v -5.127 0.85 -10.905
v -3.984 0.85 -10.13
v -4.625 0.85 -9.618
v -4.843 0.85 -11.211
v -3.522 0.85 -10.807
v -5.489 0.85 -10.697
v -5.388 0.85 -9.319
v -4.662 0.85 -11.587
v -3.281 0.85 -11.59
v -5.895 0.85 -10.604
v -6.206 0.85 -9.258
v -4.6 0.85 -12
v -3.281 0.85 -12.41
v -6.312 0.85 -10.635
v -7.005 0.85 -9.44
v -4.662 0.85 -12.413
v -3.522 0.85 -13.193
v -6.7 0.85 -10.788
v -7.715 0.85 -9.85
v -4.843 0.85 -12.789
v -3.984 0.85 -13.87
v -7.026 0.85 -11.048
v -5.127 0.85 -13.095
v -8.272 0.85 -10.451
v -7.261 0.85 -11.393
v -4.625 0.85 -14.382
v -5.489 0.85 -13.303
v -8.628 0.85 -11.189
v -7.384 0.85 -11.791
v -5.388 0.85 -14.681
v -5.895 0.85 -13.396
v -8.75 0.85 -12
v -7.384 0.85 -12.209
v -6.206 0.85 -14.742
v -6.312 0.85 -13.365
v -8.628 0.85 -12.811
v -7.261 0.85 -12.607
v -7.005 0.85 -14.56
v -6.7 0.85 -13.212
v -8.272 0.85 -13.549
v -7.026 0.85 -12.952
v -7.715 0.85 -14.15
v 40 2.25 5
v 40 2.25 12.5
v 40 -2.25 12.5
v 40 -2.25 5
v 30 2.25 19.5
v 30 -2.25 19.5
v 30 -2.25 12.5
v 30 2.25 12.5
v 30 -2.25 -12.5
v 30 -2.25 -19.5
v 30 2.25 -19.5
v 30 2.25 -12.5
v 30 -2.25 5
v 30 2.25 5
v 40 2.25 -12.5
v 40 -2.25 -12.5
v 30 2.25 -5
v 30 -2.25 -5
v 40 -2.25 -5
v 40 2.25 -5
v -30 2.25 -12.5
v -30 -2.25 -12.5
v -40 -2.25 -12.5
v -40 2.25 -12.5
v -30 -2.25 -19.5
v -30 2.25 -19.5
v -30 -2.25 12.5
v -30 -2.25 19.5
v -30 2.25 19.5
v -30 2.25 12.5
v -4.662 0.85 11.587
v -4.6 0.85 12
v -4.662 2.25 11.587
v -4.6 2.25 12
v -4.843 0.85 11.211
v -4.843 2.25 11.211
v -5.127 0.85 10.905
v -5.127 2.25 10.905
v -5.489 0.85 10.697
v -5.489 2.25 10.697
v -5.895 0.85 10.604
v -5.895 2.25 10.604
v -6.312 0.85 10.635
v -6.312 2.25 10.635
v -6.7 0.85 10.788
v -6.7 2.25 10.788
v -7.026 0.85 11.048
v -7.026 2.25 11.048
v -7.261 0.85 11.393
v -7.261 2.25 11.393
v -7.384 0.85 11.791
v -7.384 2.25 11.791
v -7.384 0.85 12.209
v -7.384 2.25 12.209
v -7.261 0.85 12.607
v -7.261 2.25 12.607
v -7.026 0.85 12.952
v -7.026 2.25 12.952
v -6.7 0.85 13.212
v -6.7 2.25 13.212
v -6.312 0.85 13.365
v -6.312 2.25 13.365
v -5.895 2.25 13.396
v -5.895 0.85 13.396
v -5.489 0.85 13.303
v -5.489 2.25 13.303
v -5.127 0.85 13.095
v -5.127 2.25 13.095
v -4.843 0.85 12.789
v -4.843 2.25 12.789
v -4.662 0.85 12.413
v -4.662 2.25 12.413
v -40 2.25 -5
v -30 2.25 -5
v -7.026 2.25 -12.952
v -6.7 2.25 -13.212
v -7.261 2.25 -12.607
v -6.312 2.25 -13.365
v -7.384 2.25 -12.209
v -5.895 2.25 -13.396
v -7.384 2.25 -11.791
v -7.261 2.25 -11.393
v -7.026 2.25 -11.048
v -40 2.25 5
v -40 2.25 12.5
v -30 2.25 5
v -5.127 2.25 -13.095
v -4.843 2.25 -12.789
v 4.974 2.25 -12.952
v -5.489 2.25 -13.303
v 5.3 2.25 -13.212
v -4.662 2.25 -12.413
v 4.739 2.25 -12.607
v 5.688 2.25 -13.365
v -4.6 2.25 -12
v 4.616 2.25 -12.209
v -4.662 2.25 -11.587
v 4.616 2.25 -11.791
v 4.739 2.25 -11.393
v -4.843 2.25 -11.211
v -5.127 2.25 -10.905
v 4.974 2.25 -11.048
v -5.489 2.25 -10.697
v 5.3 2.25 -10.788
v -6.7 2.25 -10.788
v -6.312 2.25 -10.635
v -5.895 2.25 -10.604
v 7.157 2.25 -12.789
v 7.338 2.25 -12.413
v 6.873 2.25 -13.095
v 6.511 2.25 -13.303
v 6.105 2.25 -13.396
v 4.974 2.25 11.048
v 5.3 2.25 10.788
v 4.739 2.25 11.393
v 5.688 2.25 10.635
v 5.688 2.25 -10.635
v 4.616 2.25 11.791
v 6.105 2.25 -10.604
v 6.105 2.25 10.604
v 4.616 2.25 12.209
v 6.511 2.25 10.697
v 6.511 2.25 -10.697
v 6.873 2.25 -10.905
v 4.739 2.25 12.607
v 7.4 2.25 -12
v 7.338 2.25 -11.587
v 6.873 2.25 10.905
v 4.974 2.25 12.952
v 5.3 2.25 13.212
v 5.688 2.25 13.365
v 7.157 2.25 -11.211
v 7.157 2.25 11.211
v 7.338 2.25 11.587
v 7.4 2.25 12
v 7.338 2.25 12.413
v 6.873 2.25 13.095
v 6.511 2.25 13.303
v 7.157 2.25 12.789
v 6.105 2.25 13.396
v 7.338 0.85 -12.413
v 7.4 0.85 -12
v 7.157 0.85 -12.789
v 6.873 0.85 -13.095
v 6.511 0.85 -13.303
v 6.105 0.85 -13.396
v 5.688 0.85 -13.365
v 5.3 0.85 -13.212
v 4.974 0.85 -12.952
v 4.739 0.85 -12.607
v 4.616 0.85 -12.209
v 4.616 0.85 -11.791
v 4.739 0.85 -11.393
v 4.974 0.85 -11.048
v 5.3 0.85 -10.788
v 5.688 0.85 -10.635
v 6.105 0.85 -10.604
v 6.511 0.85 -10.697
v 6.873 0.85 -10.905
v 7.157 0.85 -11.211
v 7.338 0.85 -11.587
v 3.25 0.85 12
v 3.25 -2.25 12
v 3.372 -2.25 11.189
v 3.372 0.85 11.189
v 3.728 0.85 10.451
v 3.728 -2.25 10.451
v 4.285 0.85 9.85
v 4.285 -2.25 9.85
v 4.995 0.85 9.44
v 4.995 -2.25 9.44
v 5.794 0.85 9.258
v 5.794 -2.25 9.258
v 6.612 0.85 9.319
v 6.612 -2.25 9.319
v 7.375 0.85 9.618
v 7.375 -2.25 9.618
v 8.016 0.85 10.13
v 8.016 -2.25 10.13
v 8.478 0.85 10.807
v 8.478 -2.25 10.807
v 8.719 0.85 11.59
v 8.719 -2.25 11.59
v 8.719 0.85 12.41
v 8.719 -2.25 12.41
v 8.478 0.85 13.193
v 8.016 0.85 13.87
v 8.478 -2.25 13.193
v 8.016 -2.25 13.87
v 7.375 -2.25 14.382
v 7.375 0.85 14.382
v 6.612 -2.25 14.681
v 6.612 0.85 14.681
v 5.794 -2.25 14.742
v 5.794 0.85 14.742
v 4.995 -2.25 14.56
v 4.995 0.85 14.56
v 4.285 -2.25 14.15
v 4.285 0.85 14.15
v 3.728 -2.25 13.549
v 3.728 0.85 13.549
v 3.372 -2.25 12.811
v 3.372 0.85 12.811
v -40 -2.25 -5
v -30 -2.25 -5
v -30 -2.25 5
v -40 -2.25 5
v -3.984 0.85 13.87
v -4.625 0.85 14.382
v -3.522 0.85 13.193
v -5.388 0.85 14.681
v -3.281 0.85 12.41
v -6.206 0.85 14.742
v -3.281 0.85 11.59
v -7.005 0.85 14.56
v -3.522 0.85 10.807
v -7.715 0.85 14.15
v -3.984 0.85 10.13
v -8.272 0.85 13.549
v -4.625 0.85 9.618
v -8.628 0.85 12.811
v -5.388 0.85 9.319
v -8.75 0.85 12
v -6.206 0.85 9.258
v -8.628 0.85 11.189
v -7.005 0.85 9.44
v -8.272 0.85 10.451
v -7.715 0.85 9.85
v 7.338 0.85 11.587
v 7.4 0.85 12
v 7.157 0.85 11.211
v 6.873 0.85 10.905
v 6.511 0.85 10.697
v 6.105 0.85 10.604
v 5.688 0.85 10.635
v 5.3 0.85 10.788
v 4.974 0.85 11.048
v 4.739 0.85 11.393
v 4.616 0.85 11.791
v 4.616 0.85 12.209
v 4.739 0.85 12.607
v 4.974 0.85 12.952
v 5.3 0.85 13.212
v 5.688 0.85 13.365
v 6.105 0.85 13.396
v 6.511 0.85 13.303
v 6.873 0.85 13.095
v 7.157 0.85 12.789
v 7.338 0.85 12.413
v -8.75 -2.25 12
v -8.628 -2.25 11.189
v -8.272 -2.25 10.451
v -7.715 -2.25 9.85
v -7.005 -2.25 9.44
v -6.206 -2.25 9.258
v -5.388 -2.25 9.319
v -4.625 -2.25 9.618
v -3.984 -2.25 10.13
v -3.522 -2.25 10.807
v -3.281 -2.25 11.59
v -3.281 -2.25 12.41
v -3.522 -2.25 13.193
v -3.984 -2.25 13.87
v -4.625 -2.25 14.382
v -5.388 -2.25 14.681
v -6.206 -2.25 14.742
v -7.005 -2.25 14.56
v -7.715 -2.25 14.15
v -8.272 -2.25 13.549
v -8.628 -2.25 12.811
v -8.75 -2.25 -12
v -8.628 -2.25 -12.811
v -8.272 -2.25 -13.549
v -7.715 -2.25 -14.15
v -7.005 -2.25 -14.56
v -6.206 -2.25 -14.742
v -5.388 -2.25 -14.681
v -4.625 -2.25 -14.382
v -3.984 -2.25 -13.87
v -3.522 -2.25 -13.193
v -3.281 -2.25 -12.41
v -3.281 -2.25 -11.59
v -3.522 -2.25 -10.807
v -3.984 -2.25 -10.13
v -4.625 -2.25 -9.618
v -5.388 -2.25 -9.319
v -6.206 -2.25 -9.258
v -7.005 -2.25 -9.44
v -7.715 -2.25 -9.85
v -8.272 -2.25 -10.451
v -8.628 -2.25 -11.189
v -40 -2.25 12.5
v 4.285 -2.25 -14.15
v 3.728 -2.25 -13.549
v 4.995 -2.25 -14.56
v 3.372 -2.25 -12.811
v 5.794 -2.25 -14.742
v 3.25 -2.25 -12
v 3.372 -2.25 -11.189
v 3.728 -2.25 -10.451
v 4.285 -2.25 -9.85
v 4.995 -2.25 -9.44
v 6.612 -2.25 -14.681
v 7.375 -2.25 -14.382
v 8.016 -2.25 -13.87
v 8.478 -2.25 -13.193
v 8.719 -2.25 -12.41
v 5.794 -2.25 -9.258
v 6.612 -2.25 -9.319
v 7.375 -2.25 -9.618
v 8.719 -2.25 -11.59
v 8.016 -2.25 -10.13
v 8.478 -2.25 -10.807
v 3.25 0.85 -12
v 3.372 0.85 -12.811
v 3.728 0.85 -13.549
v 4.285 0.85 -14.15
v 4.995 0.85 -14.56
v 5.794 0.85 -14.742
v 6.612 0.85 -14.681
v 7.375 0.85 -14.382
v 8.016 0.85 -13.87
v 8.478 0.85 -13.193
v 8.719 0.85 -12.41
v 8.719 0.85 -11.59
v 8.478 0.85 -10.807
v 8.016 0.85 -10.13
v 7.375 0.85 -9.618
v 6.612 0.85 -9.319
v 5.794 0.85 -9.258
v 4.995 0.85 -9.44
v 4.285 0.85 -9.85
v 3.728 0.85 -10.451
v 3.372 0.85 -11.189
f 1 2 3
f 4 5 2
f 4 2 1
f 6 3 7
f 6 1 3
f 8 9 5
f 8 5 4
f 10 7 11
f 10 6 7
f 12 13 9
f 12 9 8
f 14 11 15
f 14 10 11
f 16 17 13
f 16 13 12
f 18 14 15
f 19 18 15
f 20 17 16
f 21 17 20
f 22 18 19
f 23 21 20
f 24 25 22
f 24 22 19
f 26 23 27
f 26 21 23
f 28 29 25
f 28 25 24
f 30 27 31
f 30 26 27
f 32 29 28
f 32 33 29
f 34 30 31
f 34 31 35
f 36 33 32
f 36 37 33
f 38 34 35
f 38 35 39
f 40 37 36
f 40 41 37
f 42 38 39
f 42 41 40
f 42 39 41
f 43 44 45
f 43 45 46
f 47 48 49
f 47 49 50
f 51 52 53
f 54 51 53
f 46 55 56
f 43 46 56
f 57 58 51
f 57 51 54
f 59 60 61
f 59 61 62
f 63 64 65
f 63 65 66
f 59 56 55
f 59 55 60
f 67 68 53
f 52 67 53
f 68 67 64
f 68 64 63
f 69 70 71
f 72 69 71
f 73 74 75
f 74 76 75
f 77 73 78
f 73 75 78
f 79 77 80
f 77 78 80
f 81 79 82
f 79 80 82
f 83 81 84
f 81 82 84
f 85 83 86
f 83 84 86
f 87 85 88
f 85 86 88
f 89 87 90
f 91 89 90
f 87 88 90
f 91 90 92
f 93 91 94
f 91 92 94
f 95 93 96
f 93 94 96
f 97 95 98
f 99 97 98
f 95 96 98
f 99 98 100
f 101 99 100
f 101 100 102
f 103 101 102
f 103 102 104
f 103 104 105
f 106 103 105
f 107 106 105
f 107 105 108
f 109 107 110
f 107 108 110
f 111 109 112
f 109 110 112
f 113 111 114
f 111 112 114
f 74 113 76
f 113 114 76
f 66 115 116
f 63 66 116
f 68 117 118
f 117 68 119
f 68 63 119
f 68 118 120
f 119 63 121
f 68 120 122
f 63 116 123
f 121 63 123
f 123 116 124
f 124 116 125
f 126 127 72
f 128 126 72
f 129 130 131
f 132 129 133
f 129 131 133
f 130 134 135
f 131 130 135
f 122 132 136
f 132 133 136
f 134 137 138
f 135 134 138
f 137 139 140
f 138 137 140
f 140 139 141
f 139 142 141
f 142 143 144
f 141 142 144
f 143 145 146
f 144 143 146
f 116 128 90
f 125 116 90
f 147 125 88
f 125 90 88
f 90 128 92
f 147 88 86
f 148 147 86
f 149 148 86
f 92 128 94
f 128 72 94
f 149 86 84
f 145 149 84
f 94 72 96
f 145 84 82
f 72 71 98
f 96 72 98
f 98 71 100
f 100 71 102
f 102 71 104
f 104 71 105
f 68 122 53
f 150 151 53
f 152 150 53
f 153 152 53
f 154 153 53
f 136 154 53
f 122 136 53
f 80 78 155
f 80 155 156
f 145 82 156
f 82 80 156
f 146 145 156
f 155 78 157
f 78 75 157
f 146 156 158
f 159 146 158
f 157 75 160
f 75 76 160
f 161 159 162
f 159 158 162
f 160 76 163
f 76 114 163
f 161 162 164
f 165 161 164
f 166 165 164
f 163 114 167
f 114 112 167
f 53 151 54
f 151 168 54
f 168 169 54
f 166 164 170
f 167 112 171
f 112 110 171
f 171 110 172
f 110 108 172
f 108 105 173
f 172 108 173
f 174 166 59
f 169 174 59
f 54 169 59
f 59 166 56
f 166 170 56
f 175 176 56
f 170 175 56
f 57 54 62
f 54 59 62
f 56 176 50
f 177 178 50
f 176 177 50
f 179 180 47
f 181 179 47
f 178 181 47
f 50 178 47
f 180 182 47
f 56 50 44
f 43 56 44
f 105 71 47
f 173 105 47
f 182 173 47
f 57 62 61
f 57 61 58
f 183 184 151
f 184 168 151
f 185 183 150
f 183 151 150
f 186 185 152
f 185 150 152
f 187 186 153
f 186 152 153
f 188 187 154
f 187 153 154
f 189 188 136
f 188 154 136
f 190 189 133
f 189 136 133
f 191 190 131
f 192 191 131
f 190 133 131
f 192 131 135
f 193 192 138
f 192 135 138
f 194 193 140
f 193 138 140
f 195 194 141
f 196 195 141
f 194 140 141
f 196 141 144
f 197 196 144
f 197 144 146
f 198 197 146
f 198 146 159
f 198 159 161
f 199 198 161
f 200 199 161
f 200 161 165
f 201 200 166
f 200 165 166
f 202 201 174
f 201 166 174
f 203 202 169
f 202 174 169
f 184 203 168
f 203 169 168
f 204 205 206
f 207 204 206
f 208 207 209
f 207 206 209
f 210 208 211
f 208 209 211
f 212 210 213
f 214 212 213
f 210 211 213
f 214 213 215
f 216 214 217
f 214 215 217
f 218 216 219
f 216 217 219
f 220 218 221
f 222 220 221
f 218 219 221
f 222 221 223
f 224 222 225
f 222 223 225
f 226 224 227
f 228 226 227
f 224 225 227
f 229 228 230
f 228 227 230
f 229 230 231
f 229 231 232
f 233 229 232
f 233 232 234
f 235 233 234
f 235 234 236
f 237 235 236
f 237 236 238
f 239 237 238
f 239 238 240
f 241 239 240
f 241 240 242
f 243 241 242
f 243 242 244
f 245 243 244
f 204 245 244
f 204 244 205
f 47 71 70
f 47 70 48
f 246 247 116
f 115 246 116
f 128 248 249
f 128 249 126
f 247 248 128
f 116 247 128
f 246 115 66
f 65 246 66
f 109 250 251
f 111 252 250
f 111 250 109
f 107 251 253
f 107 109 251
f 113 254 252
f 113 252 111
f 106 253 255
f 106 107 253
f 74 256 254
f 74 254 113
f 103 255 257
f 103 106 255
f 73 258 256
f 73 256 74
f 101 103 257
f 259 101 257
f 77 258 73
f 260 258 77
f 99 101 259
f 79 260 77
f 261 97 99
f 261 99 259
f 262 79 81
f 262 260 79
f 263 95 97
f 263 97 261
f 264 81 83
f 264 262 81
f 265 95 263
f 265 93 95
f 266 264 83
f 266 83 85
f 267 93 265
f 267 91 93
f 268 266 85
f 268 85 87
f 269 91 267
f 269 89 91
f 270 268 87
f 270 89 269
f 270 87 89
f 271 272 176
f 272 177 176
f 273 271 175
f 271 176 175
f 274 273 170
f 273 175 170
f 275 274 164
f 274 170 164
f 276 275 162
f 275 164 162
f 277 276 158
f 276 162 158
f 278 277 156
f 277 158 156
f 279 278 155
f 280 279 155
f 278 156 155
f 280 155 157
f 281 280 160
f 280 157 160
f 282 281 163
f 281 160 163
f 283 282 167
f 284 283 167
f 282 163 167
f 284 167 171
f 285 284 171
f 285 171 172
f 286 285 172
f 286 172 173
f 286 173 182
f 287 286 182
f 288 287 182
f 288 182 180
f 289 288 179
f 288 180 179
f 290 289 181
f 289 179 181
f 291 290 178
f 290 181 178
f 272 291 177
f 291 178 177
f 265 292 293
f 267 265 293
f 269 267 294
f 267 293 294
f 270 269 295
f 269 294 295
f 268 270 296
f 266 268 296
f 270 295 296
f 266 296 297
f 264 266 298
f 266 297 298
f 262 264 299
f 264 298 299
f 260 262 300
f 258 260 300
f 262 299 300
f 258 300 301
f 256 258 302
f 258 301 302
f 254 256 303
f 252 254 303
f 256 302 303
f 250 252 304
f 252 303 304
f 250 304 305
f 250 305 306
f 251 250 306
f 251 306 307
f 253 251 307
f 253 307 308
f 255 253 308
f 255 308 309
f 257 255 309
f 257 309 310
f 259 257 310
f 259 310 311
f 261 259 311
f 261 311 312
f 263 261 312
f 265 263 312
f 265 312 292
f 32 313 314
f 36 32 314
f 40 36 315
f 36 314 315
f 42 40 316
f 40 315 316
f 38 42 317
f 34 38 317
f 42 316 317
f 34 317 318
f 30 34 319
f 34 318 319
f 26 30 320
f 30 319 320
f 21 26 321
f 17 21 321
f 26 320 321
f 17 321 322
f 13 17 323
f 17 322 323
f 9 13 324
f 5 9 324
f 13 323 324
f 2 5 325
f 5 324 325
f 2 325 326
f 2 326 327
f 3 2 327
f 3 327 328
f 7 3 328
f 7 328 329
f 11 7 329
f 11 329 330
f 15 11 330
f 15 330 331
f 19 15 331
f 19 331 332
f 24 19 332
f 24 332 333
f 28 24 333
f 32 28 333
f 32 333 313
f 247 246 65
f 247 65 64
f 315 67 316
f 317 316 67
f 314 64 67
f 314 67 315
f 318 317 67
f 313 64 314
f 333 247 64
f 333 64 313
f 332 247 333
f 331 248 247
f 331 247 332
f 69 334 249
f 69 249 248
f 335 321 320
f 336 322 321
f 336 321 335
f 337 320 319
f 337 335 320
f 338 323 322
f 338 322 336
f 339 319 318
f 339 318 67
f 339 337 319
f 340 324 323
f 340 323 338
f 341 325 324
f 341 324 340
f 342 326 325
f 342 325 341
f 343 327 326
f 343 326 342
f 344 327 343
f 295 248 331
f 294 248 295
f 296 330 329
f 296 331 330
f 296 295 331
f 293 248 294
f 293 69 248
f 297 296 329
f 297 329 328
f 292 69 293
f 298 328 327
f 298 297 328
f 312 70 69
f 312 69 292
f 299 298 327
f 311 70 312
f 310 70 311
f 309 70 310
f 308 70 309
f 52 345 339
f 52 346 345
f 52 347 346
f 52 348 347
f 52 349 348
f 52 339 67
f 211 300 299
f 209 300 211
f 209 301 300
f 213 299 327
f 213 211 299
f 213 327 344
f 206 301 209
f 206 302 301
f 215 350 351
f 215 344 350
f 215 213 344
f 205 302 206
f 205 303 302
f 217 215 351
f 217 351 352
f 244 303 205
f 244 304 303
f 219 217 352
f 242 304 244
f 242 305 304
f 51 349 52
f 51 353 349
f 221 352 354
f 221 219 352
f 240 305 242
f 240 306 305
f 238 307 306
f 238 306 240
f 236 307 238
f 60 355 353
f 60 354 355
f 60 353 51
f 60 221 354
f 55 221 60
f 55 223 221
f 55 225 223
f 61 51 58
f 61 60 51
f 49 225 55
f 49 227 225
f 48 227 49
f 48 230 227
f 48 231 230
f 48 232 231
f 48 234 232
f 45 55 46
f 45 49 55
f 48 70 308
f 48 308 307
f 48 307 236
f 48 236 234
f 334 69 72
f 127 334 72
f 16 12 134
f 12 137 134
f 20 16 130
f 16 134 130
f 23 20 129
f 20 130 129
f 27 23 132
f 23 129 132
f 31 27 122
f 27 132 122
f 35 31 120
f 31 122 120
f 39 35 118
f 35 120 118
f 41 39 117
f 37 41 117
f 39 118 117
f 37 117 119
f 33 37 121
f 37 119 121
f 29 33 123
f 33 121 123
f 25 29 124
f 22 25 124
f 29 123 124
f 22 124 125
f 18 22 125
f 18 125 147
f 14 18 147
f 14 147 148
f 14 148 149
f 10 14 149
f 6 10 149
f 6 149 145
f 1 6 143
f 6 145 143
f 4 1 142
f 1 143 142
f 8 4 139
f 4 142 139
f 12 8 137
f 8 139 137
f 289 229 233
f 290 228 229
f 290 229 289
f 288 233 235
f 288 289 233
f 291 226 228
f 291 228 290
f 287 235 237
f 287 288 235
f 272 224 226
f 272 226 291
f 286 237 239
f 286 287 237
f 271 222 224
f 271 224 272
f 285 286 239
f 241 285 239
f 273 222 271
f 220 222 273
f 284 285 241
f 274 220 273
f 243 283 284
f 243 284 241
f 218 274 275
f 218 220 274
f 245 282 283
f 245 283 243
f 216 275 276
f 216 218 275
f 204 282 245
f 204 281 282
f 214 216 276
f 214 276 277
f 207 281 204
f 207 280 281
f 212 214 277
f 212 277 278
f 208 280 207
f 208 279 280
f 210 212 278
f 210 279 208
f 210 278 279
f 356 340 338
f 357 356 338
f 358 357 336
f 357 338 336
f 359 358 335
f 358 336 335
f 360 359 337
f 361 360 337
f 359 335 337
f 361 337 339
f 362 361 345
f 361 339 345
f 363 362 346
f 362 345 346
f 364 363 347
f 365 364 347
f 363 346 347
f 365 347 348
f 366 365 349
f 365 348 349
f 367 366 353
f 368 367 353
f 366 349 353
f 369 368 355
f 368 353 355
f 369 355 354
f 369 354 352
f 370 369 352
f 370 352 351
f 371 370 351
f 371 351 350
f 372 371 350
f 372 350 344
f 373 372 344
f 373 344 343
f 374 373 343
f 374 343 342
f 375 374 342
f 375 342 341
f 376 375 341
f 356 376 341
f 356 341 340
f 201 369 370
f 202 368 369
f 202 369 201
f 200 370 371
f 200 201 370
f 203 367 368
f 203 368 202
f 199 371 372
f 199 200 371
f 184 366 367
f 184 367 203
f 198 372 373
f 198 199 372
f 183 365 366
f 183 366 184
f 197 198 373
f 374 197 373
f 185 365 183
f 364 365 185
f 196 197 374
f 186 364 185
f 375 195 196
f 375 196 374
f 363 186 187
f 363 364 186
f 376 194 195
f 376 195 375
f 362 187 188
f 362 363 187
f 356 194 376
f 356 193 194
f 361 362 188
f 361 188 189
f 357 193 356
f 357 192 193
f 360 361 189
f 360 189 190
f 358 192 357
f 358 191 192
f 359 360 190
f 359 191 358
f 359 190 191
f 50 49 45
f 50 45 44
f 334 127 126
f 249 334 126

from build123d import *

# Parameters (mm, degrees)
SKETCH1_W                       = 25
SKETCH1_H                       = 4.5
BOSS_EXTRUDE1_DEPTH             = 30
SKETCH2_W                       = 7.5
SKETCH2_H                       = 4.5
BOSS_EXTRUDE2_DEPTH             = 10
ESQUISSE1_W                     = 60
ESQUISSE1_H                     = 4.5
BOSS_EXTRU_1_DEPTH              = 7
CBORE_FOR_M3_SBHCS2_D           = 2.8
CBORE_FOR_M3_SBHCS2_CBORE_D     = 5.5
CBORE_FOR_M3_SBHCS2_CBORE_DEPTH = 3.1


with BuildPart() as part:
    # Sketch1 → Boss-Extrude1 (new, symmetric)
    with BuildSketch(Plane(origin=(0, 0, 0), x_dir=(0, 0, -1), z_dir=(1, 0, 0))):
        Rectangle(SKETCH1_W, SKETCH1_H)
    extrude(amount=BOSS_EXTRUDE1_DEPTH, both=True)

    # Sketch2 → Boss-Extrude2 (add)
    with BuildSketch(Plane(origin=(30, 0, 0), x_dir=(0, 0, -1), z_dir=(1, 0, 0))):
        with Locations((-8.75, 0)):
            Rectangle(SKETCH2_W, SKETCH2_H)
        with Locations((8.75, 0)):
            Rectangle(SKETCH2_W, SKETCH2_H)
    boss_extrude2 = extrude(amount=BOSS_EXTRUDE2_DEPTH)

    # Esquisse1 → Boss.-Extru.1 (add)
    with BuildSketch(Plane.XY.offset(12.5)):
        Rectangle(ESQUISSE1_W, ESQUISSE1_H)
    boss_extru_1 = extrude(amount=BOSS_EXTRU_1_DEPTH)

    # Symétrie1: Boss.-Extru.1 across plane
    add(boss_extru_1.mirror(Plane.XY))

    # Mirror1: Boss-Extrude2 across plane
    add(boss_extrude2.mirror(Plane(origin=(0, 0, 0), x_dir=(0, 0, 1), z_dir=(1, 0, 0))))

    # CBORE for M3 SBHCS2 (through all)
    with Locations(Plane(origin=(0, -2.25, 0), x_dir=(-1, 0, 0), z_dir=(0, -1, 0))):
        with Locations((-6, 12), (6, 12), (6, -12), (-6, -12)):
            CounterBoreHole(CBORE_FOR_M3_SBHCS2_D / 2, CBORE_FOR_M3_SBHCS2_CBORE_D / 2, CBORE_FOR_M3_SBHCS2_CBORE_DEPTH)


solid = part.part
